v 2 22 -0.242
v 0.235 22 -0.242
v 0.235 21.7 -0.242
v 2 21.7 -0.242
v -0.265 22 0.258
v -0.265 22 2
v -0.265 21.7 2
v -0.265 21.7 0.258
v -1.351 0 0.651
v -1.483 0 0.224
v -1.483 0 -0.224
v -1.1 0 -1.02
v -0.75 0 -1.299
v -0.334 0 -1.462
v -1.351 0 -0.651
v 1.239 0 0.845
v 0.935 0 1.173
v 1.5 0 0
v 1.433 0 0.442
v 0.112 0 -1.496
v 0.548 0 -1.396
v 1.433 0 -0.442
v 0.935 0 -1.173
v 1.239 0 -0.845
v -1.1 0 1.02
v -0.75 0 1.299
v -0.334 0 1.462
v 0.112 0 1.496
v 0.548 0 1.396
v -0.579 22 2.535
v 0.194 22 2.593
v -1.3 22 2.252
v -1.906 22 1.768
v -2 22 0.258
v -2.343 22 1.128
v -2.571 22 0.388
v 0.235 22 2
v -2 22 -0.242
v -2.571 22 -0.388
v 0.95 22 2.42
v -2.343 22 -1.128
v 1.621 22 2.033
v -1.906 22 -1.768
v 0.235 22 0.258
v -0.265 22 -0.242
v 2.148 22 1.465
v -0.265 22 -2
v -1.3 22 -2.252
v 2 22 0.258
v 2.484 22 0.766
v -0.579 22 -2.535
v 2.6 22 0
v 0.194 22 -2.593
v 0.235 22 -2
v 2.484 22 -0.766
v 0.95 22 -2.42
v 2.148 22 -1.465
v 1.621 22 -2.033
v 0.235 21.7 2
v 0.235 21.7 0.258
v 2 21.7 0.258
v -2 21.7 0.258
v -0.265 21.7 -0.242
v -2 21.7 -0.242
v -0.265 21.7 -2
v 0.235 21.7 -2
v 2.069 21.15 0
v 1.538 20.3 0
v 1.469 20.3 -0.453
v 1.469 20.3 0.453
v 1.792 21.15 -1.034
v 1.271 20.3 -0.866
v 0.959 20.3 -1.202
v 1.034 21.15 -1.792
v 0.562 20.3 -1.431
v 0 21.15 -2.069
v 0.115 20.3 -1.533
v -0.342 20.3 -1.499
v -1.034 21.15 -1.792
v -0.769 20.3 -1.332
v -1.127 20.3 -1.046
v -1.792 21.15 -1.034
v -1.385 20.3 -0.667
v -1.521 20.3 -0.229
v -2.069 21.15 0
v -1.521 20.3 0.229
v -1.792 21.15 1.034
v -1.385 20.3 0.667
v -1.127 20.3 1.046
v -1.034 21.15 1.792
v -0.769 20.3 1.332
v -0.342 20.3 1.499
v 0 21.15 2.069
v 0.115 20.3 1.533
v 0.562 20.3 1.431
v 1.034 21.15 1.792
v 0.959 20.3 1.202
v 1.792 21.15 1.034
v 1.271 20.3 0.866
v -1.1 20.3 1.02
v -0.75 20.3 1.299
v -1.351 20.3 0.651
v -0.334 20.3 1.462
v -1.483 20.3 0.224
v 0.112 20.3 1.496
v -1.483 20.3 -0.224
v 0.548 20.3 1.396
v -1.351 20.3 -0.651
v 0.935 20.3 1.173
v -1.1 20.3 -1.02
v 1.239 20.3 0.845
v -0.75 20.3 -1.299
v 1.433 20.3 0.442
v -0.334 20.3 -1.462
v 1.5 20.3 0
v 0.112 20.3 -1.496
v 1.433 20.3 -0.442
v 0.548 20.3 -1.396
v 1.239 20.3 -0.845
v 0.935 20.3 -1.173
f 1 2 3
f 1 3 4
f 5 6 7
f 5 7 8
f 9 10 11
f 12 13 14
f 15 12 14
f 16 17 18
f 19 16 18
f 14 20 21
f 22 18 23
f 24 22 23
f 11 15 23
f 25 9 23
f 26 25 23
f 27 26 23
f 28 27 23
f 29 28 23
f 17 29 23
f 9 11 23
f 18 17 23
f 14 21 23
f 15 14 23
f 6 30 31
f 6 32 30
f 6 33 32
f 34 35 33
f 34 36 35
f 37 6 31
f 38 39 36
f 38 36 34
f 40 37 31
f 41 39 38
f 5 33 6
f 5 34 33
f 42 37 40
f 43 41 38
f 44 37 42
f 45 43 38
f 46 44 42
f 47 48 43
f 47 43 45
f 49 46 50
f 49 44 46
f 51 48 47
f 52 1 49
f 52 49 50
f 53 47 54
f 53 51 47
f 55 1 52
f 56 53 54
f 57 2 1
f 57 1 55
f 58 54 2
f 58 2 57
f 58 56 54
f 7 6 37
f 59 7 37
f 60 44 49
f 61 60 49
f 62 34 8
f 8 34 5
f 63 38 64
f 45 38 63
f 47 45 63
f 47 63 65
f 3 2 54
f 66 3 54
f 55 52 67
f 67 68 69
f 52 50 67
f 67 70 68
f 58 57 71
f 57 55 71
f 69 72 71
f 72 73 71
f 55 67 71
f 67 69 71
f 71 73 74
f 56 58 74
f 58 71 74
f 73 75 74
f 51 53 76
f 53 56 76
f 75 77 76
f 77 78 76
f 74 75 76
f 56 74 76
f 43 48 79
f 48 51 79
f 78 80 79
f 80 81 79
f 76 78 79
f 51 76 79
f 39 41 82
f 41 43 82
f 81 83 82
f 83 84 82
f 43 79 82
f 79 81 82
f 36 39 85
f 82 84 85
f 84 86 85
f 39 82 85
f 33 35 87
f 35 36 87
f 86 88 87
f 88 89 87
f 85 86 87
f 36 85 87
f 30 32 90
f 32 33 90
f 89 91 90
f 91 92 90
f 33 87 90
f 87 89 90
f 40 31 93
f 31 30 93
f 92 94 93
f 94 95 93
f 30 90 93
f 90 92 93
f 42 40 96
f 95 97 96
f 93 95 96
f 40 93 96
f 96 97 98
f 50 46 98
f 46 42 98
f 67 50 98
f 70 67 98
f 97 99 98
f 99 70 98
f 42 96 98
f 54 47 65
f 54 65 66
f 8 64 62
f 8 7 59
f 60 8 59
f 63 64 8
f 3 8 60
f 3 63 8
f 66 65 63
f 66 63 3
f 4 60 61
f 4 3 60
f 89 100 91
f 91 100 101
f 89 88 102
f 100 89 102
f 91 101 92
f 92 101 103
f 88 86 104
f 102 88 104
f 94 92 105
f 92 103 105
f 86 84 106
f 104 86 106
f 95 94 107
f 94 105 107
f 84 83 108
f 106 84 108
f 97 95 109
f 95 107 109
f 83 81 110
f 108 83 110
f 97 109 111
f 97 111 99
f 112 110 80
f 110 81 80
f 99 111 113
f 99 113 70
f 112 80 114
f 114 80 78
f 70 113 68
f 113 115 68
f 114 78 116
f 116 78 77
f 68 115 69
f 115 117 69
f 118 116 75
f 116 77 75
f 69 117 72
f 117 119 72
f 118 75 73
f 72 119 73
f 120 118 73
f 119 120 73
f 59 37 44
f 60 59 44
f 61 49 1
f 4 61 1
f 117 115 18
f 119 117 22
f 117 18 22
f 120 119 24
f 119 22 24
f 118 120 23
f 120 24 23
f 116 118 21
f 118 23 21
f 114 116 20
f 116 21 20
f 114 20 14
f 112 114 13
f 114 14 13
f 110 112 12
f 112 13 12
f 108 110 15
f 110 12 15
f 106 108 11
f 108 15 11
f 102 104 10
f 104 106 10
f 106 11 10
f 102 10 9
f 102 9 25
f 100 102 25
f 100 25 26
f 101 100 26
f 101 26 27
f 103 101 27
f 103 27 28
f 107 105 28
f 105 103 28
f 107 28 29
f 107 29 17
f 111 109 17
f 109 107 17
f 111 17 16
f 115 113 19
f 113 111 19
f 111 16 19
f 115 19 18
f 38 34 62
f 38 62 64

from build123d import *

# Parameters (mm, degrees)
SKETCH1_R           = 1.5
BOSS_EXTRUDE1_DEPTH = 22
SKETCH2_R           = 2.6
BOSS_EXTRUDE2_DEPTH = 1.7
BOSS_EXTRUDE2_TAPER = 32
SKETCH3_W           = 0.5
SKETCH3_H           = 1.758378485
SKETCH3_H_2         = 1.741621515
SKETCH3_W_2         = 1.734727157
SKETCH3_H_3         = 0.5
SKETCH3_W_3         = 1.765272843
CUT_EXTRUDE1_DEPTH  = 0.3


with BuildPart() as part:
    # Sketch1 → Boss-Extrude1 (new body)
    with BuildSketch(Plane(origin=(0, 0, 0), x_dir=(1, 0, 0), z_dir=(0, 1, 0))):
        Circle(SKETCH1_R)
    extrude(amount=BOSS_EXTRUDE1_DEPTH)

    # Sketch2 → Boss-Extrude2 (add)
    with BuildSketch(Plane(origin=(0, 22, 0), x_dir=(1, 0, 0), z_dir=(0, 1, 0))):
        Circle(SKETCH2_R)
    extrude(amount=-BOSS_EXTRUDE2_DEPTH, taper=BOSS_EXTRUDE2_TAPER)

    # Sketch3 → Cut-Extrude1 (cut)
    with BuildSketch(Plane(origin=(0, 22, 0), x_dir=(1, 0, 0), z_dir=(0, 1, 0))):
        with Locations((-0.015272843, 1.120810757)):
            Rectangle(SKETCH3_W, SKETCH3_H)
        with Locations((-0.015272843, -1.129189243)):
            Rectangle(SKETCH3_W, SKETCH3_H_2)
        with Locations((-1.132636421, -0.008378485)):
            Rectangle(SKETCH3_W_2, SKETCH3_H_3)
        with Locations((1.117363579, -0.008378485)):
            Rectangle(SKETCH3_W_3, SKETCH3_H_3)
        with Locations((-0.015272843, -0.008378485)):
            Rectangle(SKETCH3_W, SKETCH3_H_3)
    extrude(amount=-CUT_EXTRUDE1_DEPTH, mode=Mode.SUBTRACT)


solid = part.part
